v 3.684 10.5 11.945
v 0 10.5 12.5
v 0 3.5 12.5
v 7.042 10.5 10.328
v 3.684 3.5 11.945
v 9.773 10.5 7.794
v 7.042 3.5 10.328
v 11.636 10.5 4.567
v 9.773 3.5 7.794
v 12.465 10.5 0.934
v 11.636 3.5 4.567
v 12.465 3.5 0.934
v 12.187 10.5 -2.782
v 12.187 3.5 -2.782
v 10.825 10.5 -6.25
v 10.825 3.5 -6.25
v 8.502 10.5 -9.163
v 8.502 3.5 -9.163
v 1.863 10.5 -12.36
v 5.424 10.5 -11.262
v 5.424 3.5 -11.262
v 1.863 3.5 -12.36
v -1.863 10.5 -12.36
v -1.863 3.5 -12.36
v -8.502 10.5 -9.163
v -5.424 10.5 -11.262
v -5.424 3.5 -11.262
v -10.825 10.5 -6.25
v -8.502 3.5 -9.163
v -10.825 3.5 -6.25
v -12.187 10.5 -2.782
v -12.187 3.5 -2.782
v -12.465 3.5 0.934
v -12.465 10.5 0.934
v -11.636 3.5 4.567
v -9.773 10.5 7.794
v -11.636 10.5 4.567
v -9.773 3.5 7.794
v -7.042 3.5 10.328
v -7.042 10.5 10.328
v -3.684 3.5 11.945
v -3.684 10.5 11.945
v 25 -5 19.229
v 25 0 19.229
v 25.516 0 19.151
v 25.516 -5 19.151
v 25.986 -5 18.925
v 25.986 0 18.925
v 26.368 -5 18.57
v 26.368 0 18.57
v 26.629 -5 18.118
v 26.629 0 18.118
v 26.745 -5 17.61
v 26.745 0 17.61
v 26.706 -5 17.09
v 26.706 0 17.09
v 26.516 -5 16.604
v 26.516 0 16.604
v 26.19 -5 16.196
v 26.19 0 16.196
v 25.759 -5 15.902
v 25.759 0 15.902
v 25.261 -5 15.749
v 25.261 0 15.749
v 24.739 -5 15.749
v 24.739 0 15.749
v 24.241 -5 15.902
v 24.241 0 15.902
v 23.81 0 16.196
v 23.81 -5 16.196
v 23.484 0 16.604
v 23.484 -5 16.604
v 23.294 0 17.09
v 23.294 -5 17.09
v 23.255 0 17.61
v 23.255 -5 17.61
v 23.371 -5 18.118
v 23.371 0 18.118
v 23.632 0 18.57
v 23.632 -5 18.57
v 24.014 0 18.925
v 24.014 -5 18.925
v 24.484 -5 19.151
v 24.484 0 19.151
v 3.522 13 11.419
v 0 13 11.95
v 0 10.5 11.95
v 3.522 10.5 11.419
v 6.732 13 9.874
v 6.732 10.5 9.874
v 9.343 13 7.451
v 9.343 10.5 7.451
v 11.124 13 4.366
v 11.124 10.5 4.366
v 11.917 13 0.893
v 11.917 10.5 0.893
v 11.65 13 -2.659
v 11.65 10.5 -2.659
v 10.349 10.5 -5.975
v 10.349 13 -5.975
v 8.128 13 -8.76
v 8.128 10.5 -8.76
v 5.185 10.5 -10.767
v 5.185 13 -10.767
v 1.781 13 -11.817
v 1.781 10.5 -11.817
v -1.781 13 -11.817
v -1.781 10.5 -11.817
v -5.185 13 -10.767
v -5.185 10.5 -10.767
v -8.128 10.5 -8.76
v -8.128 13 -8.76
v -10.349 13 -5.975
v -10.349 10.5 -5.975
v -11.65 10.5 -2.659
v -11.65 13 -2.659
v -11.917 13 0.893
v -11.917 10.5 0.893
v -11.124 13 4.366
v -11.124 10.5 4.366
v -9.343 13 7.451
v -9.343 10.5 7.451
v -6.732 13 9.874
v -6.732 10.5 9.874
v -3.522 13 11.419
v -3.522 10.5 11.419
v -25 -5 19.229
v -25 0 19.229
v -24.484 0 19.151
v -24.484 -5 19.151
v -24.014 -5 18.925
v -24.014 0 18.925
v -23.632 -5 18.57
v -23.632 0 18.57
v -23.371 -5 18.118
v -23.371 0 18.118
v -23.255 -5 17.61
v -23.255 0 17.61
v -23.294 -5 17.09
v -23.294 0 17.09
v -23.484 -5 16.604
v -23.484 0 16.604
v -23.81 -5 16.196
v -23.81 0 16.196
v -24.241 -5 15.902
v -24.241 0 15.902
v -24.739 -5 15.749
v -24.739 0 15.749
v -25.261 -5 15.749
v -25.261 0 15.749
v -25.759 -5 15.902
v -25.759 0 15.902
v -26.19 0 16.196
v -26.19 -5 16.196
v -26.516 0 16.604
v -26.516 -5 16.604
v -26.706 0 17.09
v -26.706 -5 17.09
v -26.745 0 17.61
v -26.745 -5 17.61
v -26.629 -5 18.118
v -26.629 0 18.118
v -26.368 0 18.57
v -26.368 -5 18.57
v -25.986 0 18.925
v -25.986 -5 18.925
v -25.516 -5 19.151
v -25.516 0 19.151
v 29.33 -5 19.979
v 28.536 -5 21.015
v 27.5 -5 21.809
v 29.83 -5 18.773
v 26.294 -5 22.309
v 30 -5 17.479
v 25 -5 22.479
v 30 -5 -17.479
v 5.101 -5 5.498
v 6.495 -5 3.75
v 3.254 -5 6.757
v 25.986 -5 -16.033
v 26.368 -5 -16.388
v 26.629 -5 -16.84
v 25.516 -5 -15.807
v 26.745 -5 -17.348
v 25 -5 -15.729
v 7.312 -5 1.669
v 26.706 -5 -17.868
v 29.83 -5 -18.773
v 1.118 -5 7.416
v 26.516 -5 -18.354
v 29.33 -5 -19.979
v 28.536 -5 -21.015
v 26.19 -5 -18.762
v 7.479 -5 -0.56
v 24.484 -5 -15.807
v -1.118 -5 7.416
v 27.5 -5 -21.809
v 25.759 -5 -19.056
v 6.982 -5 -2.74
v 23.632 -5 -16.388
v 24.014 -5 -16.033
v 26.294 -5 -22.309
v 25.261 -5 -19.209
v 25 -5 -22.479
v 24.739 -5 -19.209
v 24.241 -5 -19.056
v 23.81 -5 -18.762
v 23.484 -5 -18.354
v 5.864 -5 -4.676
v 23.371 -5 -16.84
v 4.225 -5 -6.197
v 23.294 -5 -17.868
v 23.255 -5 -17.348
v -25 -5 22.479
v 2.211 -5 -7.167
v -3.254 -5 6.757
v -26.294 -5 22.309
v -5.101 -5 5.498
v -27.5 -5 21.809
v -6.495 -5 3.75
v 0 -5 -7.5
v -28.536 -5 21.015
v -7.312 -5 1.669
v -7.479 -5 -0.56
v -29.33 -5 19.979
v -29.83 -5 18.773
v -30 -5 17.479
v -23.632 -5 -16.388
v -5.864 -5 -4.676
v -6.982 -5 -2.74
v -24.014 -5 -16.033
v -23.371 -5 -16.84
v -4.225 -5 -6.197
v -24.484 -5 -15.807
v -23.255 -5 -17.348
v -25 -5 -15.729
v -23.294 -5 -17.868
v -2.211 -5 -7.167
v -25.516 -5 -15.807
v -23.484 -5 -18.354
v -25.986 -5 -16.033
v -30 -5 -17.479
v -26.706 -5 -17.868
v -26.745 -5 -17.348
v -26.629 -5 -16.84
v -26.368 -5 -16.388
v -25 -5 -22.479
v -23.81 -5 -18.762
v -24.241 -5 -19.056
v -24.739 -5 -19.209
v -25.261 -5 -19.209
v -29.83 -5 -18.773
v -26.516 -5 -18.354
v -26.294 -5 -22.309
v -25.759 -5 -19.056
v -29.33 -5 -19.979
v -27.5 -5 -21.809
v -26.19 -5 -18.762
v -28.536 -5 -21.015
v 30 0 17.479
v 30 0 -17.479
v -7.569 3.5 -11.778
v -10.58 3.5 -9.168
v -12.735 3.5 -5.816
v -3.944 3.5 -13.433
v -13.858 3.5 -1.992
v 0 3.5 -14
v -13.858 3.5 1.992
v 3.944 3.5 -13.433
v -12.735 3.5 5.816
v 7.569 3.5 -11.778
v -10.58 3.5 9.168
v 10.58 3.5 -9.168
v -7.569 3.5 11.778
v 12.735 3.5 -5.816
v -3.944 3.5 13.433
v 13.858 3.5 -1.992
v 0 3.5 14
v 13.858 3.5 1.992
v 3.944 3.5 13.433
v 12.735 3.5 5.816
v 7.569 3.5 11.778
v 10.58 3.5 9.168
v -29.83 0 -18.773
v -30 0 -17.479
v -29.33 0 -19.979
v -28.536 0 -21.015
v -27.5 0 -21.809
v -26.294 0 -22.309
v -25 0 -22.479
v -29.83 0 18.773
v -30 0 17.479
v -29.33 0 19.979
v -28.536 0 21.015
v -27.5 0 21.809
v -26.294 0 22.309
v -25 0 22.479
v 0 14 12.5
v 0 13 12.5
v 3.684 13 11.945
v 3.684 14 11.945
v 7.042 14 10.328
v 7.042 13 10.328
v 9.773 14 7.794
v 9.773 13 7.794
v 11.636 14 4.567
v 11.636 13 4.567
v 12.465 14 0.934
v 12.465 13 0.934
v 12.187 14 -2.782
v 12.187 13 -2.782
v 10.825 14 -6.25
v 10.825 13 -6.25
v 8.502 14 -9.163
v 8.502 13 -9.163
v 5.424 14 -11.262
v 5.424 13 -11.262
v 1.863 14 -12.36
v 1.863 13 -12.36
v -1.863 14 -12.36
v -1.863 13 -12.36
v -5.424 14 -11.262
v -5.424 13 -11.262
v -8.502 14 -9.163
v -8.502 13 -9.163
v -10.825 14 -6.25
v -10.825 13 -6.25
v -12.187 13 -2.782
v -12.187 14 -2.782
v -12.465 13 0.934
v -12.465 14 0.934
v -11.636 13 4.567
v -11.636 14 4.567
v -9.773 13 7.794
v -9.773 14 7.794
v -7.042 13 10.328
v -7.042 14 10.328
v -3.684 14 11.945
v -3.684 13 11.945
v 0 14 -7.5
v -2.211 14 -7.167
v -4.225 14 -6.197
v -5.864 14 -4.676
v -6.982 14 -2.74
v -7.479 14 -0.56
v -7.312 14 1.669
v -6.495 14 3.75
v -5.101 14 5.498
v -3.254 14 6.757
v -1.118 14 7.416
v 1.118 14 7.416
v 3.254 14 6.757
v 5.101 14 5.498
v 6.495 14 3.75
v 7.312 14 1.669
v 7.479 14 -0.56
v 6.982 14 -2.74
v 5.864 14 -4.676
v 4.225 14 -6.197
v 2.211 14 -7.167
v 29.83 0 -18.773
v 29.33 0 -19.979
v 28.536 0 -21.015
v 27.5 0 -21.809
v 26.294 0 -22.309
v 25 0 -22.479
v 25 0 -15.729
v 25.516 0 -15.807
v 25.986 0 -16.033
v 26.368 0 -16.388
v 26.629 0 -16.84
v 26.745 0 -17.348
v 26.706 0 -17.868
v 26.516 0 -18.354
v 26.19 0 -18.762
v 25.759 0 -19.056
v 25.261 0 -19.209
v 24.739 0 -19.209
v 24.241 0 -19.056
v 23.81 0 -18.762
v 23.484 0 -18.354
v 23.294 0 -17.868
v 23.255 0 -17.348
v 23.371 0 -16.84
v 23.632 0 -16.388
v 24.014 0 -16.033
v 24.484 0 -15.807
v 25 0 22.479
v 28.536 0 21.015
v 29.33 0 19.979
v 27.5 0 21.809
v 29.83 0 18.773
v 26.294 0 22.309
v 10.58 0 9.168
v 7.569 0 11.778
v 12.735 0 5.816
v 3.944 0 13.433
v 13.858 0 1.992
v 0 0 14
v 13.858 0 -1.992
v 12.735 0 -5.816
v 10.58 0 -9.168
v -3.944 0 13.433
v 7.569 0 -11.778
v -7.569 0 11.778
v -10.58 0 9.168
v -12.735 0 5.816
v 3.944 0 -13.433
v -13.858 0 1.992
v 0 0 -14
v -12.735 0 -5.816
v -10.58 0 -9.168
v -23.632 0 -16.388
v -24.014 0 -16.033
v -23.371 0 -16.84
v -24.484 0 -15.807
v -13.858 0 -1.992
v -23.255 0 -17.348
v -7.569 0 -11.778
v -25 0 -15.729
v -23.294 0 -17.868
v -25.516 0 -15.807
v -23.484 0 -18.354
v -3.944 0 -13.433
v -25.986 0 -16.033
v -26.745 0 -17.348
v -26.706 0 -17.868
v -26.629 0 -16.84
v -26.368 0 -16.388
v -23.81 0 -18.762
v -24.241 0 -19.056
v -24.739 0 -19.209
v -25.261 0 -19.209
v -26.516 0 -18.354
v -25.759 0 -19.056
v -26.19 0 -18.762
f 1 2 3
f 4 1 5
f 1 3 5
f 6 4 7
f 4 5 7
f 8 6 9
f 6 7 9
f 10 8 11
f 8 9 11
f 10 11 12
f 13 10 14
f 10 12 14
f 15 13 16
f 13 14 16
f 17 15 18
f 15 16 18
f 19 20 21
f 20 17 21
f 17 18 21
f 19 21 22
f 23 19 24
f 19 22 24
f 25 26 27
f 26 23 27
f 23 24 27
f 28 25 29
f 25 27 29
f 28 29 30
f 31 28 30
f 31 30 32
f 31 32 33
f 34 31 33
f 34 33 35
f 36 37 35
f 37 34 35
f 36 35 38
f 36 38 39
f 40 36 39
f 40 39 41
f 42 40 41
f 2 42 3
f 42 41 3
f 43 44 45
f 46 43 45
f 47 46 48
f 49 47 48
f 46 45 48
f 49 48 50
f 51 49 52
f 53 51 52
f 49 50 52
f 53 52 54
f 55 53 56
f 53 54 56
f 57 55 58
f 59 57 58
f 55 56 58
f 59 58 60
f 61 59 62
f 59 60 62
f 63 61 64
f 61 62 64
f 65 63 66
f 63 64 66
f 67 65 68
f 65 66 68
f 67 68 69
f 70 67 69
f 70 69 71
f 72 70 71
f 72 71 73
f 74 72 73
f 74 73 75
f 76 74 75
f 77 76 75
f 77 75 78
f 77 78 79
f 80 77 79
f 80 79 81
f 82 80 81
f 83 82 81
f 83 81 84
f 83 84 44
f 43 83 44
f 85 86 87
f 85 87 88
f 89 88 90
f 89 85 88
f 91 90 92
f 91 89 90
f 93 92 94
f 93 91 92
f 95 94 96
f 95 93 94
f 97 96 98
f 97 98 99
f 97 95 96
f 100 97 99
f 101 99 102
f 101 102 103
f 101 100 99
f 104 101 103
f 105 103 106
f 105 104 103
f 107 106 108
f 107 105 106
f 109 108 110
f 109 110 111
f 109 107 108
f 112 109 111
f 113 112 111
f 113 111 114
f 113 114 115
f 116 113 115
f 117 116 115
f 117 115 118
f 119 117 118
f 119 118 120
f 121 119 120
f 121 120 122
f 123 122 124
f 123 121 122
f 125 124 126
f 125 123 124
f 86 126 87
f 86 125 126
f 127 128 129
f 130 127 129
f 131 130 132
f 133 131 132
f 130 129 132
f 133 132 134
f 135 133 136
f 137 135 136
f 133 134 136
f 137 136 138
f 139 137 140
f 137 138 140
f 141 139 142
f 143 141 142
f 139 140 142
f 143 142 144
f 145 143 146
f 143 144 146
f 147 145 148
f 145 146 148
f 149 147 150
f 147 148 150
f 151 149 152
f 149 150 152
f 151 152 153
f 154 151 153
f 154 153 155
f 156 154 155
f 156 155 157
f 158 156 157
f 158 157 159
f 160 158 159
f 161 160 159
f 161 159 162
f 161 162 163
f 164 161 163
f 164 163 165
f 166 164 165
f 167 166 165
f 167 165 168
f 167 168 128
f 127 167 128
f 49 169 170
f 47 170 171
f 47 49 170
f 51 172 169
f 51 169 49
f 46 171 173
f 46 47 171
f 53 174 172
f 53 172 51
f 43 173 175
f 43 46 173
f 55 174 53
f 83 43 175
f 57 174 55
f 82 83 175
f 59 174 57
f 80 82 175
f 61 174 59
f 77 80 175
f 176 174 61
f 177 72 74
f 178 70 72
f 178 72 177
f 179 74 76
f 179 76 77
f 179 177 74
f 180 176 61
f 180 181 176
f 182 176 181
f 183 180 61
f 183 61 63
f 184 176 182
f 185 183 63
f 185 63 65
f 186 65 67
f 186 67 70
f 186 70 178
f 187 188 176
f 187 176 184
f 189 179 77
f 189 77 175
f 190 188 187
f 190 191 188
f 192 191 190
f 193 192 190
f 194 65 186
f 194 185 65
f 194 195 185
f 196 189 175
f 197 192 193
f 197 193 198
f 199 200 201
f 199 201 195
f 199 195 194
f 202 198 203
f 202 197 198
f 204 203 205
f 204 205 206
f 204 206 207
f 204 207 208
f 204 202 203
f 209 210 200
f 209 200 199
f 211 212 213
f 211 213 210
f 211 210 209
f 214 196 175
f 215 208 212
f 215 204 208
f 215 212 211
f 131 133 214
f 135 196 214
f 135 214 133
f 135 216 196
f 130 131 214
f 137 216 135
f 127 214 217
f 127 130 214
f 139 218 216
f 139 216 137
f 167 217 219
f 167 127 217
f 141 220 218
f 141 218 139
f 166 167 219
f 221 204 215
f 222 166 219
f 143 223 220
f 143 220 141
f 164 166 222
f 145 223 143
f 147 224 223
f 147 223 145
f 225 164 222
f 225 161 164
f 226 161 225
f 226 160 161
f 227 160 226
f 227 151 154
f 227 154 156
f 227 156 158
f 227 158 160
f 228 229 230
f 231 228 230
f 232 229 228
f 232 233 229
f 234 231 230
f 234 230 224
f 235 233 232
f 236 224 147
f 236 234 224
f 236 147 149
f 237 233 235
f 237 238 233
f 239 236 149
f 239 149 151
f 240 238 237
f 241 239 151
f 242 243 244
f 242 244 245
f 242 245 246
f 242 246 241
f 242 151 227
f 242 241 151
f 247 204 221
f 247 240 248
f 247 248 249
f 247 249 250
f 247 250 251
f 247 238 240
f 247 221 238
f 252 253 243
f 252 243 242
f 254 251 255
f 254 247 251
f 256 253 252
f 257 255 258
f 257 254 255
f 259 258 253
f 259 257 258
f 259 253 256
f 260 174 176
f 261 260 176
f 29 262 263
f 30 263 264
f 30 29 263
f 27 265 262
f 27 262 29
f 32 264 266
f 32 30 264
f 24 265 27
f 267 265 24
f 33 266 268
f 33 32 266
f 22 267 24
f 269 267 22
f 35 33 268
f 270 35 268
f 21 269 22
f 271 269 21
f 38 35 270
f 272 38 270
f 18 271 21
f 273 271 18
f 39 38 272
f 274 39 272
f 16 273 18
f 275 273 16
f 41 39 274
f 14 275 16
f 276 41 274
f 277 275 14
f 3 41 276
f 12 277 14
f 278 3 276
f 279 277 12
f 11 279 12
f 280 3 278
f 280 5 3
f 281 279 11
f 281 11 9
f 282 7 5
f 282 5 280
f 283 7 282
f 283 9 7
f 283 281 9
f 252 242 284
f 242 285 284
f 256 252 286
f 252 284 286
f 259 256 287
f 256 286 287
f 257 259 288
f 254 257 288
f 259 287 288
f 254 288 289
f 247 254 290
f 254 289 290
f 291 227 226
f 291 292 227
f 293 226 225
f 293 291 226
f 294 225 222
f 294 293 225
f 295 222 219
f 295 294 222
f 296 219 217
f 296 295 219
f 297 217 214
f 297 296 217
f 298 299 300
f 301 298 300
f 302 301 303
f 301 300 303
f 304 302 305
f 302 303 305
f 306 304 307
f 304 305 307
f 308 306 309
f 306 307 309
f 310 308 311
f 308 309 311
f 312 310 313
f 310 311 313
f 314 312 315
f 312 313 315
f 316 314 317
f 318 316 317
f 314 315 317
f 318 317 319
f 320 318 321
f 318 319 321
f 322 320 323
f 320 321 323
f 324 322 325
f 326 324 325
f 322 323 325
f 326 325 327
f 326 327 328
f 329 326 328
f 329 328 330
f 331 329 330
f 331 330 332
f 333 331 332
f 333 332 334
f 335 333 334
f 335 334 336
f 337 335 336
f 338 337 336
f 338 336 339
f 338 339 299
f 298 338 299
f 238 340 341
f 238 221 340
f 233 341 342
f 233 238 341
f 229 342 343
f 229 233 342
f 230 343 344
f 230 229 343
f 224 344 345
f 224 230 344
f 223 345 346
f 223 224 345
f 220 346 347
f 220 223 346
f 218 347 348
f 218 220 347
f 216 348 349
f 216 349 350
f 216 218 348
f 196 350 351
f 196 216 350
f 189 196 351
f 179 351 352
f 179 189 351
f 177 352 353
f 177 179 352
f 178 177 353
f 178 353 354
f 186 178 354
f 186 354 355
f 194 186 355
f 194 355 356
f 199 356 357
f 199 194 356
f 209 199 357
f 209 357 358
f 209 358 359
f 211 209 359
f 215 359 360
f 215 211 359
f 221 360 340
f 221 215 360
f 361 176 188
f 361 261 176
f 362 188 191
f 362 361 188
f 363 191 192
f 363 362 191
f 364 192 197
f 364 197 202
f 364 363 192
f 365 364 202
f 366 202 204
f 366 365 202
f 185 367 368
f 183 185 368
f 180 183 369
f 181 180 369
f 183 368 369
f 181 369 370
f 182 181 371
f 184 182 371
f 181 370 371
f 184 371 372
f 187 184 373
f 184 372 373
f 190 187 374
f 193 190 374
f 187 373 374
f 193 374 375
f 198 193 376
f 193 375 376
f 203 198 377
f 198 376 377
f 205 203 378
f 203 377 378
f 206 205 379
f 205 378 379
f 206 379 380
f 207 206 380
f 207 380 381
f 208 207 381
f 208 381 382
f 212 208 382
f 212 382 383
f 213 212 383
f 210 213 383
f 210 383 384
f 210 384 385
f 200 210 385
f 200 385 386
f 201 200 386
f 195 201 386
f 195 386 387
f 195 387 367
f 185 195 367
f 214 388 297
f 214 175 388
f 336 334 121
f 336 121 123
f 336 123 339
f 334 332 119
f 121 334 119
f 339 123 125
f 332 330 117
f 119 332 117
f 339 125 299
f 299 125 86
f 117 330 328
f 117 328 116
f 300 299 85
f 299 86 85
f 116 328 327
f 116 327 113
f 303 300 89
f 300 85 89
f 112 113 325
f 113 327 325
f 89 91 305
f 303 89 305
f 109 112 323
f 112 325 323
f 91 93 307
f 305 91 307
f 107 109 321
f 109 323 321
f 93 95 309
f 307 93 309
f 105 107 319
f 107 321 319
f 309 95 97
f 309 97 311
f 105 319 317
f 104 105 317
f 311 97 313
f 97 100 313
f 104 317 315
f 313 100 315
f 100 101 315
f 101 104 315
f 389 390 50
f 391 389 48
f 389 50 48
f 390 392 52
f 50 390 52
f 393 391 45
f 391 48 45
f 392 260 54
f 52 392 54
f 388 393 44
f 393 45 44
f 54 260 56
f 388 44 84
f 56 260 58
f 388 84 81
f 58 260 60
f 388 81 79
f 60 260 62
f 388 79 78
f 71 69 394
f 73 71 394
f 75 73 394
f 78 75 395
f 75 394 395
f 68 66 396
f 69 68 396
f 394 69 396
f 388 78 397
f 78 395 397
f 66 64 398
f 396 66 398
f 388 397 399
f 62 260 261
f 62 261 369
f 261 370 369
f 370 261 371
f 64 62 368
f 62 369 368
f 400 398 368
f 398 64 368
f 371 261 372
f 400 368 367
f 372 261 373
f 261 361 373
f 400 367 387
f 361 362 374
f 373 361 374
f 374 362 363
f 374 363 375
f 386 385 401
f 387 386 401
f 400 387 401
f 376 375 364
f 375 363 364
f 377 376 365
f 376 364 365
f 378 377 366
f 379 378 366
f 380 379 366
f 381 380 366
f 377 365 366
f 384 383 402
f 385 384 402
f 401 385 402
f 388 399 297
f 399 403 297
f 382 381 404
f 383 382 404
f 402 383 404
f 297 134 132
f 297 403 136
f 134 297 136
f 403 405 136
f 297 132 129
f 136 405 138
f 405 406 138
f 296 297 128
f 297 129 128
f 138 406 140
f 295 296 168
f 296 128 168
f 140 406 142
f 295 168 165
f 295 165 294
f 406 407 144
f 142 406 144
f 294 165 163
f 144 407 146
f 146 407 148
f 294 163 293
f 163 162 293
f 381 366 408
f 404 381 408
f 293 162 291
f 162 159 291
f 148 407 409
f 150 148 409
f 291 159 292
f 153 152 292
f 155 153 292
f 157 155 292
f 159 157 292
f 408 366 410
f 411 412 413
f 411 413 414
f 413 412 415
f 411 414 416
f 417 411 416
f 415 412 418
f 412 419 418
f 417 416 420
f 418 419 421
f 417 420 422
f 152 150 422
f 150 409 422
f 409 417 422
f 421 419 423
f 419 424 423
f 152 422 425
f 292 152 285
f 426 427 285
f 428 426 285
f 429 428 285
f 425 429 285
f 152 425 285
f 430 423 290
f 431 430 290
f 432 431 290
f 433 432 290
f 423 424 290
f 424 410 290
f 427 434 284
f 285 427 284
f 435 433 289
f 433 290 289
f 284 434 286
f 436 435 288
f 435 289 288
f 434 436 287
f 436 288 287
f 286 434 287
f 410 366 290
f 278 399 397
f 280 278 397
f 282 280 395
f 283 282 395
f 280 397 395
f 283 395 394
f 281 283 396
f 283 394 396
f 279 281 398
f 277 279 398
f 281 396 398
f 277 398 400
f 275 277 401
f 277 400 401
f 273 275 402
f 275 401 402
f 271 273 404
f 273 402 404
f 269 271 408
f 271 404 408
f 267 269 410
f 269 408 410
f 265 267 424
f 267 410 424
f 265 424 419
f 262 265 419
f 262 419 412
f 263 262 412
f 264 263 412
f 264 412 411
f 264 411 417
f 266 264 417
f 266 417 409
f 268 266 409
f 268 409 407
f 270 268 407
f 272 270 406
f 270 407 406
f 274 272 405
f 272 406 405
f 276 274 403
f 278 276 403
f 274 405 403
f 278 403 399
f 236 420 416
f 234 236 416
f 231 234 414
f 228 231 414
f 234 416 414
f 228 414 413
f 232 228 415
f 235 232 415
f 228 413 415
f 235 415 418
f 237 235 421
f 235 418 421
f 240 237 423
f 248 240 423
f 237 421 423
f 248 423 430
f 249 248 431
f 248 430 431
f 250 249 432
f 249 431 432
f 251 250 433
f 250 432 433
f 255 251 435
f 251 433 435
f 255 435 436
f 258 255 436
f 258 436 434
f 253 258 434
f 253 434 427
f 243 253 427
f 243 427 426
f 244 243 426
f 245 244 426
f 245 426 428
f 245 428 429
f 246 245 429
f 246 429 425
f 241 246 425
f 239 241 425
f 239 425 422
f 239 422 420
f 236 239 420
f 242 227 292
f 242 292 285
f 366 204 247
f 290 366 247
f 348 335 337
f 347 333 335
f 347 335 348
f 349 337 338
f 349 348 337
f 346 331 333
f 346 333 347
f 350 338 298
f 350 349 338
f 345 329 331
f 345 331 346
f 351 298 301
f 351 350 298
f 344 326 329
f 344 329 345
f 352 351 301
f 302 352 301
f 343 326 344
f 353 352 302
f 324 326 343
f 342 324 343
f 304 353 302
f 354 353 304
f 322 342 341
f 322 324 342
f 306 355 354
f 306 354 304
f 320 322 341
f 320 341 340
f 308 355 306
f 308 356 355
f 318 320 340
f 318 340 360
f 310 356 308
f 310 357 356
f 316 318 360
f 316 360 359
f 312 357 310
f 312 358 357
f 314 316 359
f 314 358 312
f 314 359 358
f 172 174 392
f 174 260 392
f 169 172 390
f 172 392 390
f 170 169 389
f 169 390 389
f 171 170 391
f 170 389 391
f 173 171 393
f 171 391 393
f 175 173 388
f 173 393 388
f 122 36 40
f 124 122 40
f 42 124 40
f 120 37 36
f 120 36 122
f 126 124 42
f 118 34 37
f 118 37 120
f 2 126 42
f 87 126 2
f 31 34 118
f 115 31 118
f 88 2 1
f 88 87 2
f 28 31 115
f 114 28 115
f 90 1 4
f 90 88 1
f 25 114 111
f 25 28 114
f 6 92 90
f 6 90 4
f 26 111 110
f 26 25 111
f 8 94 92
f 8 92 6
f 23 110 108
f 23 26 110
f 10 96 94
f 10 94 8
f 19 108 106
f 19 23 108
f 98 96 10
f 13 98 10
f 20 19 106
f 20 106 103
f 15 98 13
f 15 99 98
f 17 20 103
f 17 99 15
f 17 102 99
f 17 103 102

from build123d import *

# Parameters (mm, degrees)
SKETCH1_R           = 12.5
SKETCH1_R_2         = 9.5
BOSS_EXTRUDE1_DEPTH = 14
SKETCH2_W           = 64.506168934
SKETCH2_H           = 47.83380527
BOSS_EXTRUDE2_DEPTH = 5
SKETCH3_R           = 7.5
CUT_EXTRUDE1_DEPTH  = 5
FILLET1_R           = 10
SKETCH4_R           = 41.339159207
SKETCH4_R_2         = 22.478966411
CUT_EXTRUDE2_DEPTH  = 10
SKETCH5_W           = 60
SKETCH5_H           = 44.957932822
SKETCH5_R           = 6
BOSS_EXTRUDE3_DEPTH = 5
FILLET2_R           = 5
SKETCH6_R           = 7.5
CUT_EXTRUDE3_DEPTH  = 10.435721216
SKETCH7_R           = 14
SKETCH7_R_2         = 12.5
BOSS_EXTRUDE4_DEPTH = 3.5
SKETCH8_R           = 13.175914581
SKETCH8_R_2         = 11.95
CUT_EXTRUDE4_DEPTH  = 2.5
BOSS_EXTRUDE5_START = -14
SKETCH9_R           = 9.5
SKETCH9_R_2         = 7.5
BOSS_EXTRUDE5_DEPTH = 14
SKETCH11_R          = 1.75
CUT_EXTRUDE5_DEPTH  = 6.2


with BuildPart() as part:
    # Sketch1 → Boss-Extrude1 (new body)
    with BuildSketch(Plane(origin=(0, 0, 0), x_dir=(1, 0, 0), z_dir=(0, 1, 0))):
        with Locations(Location((0, 0, 0), (0, 0, 270))):
            Circle(SKETCH1_R)
        with Locations(Location((0, 0, 0), (0, 0, 270))):
            Circle(SKETCH1_R_2, mode=Mode.SUBTRACT)
    extrude(amount=BOSS_EXTRUDE1_DEPTH)

    # Sketch2 → Boss-Extrude2 (add)
    with BuildSketch(Plane(origin=(0, 0, 0), x_dir=(-1, 0, 0), z_dir=(0, -1, 0))):
        Rectangle(SKETCH2_W, SKETCH2_H)
    extrude(amount=BOSS_EXTRUDE2_DEPTH)

    # Sketch3 → Cut-Extrude1 (cut)
    with BuildSketch(Plane(origin=(0, 0, 0), x_dir=(1, 0, 0), z_dir=(0, 1, 0))):
        with Locations(Location((0, 0, 0), (0, 0, 270))):
            Circle(SKETCH3_R)
    extrude(amount=-CUT_EXTRUDE1_DEPTH, mode=Mode.SUBTRACT)

    # Fillet1
    fillet1_edges = [part.edges().sort_by_distance(p)[0] for p in [
        (32.253084467, -2.5, -23.916902635),
        (32.253084467, -2.5, 23.916902635),
        (-32.253084467, -2.5, 23.916902635),
        (-32.253084467, -2.5, -23.916902635),
    ]]
    fillet(fillet1_edges, radius=FILLET1_R)

    # Sketch4 → Cut-Extrude2 (cut)
    with BuildSketch(Plane(origin=(0, 0, 0), x_dir=(1, 0, 0), z_dir=(0, 1, 0))):
        Circle(SKETCH4_R)
        with Locations(Location((0, 0, 0), (0, 0, 270))):
            Circle(SKETCH4_R_2, mode=Mode.SUBTRACT)
    extrude(amount=-CUT_EXTRUDE2_DEPTH, mode=Mode.SUBTRACT)

    # Sketch5 → Boss-Extrude3 (add)
    with BuildSketch(Plane(origin=(0, -5, 0), x_dir=(-1, 0, 0), z_dir=(0, -1, 0))):
        Rectangle(SKETCH5_W, SKETCH5_H)
        with Locations(Location((0, 0, 0), (0, 0, 90))):
            Circle(SKETCH5_R, mode=Mode.SUBTRACT)
    extrude(amount=-BOSS_EXTRUDE3_DEPTH)

    # Fillet2
    fillet2_edges = [part.edges().sort_by_distance(p)[0] for p in [
        (30, -2.5, -22.478966411),
        (-30, -2.5, 22.478966411),
        (30, -2.5, 22.478966411),
        (-30, -2.5, -22.478966411),
    ]]
    fillet(fillet2_edges, radius=FILLET2_R)

    # Sketch6 → Cut-Extrude3 (cut)
    with BuildSketch(Plane(origin=(0, -5, 0), x_dir=(-1, 0, 0), z_dir=(0, -1, 0))):
        with Locations(Location((0, 0, 0), (0, 0, 90))):
            Circle(SKETCH6_R)
    extrude(amount=-CUT_EXTRUDE3_DEPTH, mode=Mode.SUBTRACT)

    # Sketch7 → Boss-Extrude4 (add)
    with BuildSketch(Plane(origin=(0, 0, 0), x_dir=(1, 0, 0), z_dir=(0, 1, 0))):
        with Locations(Location((0, 0, 0), (0, 0, 270))):
            Circle(SKETCH7_R)
        with Locations(Location((0, 0, 0), (0, 0, 270))):
            Circle(SKETCH7_R_2, mode=Mode.SUBTRACT)
    extrude(amount=BOSS_EXTRUDE4_DEPTH)

    # Sketch8 → Cut-Extrude4 (cut)
    with BuildSketch(Plane(origin=(0, 13, 0), x_dir=(1, 0, 0), z_dir=(0, 1, 0))):
        Circle(SKETCH8_R)
        with Locations(Location((0, 0, 0), (0, 0, 270))):
            Circle(SKETCH8_R_2, mode=Mode.SUBTRACT)
    extrude(amount=-CUT_EXTRUDE4_DEPTH, mode=Mode.SUBTRACT)

    # Sketch9 → Boss-Extrude5 (add)
    with BuildSketch(Plane(origin=(0, 14, 0), x_dir=(1, 0, 0), z_dir=(0, 1, 0)).offset(BOSS_EXTRUDE5_START)):
        Circle(SKETCH9_R)
        with Locations(Location((0, 0, 0), (0, 0, 90))):
            Circle(SKETCH9_R_2, mode=Mode.SUBTRACT)
    extrude(amount=BOSS_EXTRUDE5_DEPTH)

    # Sketch11 → Cut-Extrude5 (cut)
    with BuildSketch(Plane(origin=(0, 0, 0), x_dir=(1, 0, 0), z_dir=(0, 1, 0))):
        with Locations(Location((-25, 17.478966411, 0), (0, 0, 270))):
            Circle(SKETCH11_R)
        with Locations(Location((25, 17.478966411, 0), (0, 0, 270))):
            Circle(SKETCH11_R)
        with Locations(Location((25, -17.478966411, 0), (0, 0, 270))):
            Circle(SKETCH11_R)
        with Locations(Location((-25, -17.478966411, 0), (0, 0, 270))):
            Circle(SKETCH11_R)
    extrude(amount=-CUT_EXTRUDE5_DEPTH, mode=Mode.SUBTRACT)


solid = part.part
